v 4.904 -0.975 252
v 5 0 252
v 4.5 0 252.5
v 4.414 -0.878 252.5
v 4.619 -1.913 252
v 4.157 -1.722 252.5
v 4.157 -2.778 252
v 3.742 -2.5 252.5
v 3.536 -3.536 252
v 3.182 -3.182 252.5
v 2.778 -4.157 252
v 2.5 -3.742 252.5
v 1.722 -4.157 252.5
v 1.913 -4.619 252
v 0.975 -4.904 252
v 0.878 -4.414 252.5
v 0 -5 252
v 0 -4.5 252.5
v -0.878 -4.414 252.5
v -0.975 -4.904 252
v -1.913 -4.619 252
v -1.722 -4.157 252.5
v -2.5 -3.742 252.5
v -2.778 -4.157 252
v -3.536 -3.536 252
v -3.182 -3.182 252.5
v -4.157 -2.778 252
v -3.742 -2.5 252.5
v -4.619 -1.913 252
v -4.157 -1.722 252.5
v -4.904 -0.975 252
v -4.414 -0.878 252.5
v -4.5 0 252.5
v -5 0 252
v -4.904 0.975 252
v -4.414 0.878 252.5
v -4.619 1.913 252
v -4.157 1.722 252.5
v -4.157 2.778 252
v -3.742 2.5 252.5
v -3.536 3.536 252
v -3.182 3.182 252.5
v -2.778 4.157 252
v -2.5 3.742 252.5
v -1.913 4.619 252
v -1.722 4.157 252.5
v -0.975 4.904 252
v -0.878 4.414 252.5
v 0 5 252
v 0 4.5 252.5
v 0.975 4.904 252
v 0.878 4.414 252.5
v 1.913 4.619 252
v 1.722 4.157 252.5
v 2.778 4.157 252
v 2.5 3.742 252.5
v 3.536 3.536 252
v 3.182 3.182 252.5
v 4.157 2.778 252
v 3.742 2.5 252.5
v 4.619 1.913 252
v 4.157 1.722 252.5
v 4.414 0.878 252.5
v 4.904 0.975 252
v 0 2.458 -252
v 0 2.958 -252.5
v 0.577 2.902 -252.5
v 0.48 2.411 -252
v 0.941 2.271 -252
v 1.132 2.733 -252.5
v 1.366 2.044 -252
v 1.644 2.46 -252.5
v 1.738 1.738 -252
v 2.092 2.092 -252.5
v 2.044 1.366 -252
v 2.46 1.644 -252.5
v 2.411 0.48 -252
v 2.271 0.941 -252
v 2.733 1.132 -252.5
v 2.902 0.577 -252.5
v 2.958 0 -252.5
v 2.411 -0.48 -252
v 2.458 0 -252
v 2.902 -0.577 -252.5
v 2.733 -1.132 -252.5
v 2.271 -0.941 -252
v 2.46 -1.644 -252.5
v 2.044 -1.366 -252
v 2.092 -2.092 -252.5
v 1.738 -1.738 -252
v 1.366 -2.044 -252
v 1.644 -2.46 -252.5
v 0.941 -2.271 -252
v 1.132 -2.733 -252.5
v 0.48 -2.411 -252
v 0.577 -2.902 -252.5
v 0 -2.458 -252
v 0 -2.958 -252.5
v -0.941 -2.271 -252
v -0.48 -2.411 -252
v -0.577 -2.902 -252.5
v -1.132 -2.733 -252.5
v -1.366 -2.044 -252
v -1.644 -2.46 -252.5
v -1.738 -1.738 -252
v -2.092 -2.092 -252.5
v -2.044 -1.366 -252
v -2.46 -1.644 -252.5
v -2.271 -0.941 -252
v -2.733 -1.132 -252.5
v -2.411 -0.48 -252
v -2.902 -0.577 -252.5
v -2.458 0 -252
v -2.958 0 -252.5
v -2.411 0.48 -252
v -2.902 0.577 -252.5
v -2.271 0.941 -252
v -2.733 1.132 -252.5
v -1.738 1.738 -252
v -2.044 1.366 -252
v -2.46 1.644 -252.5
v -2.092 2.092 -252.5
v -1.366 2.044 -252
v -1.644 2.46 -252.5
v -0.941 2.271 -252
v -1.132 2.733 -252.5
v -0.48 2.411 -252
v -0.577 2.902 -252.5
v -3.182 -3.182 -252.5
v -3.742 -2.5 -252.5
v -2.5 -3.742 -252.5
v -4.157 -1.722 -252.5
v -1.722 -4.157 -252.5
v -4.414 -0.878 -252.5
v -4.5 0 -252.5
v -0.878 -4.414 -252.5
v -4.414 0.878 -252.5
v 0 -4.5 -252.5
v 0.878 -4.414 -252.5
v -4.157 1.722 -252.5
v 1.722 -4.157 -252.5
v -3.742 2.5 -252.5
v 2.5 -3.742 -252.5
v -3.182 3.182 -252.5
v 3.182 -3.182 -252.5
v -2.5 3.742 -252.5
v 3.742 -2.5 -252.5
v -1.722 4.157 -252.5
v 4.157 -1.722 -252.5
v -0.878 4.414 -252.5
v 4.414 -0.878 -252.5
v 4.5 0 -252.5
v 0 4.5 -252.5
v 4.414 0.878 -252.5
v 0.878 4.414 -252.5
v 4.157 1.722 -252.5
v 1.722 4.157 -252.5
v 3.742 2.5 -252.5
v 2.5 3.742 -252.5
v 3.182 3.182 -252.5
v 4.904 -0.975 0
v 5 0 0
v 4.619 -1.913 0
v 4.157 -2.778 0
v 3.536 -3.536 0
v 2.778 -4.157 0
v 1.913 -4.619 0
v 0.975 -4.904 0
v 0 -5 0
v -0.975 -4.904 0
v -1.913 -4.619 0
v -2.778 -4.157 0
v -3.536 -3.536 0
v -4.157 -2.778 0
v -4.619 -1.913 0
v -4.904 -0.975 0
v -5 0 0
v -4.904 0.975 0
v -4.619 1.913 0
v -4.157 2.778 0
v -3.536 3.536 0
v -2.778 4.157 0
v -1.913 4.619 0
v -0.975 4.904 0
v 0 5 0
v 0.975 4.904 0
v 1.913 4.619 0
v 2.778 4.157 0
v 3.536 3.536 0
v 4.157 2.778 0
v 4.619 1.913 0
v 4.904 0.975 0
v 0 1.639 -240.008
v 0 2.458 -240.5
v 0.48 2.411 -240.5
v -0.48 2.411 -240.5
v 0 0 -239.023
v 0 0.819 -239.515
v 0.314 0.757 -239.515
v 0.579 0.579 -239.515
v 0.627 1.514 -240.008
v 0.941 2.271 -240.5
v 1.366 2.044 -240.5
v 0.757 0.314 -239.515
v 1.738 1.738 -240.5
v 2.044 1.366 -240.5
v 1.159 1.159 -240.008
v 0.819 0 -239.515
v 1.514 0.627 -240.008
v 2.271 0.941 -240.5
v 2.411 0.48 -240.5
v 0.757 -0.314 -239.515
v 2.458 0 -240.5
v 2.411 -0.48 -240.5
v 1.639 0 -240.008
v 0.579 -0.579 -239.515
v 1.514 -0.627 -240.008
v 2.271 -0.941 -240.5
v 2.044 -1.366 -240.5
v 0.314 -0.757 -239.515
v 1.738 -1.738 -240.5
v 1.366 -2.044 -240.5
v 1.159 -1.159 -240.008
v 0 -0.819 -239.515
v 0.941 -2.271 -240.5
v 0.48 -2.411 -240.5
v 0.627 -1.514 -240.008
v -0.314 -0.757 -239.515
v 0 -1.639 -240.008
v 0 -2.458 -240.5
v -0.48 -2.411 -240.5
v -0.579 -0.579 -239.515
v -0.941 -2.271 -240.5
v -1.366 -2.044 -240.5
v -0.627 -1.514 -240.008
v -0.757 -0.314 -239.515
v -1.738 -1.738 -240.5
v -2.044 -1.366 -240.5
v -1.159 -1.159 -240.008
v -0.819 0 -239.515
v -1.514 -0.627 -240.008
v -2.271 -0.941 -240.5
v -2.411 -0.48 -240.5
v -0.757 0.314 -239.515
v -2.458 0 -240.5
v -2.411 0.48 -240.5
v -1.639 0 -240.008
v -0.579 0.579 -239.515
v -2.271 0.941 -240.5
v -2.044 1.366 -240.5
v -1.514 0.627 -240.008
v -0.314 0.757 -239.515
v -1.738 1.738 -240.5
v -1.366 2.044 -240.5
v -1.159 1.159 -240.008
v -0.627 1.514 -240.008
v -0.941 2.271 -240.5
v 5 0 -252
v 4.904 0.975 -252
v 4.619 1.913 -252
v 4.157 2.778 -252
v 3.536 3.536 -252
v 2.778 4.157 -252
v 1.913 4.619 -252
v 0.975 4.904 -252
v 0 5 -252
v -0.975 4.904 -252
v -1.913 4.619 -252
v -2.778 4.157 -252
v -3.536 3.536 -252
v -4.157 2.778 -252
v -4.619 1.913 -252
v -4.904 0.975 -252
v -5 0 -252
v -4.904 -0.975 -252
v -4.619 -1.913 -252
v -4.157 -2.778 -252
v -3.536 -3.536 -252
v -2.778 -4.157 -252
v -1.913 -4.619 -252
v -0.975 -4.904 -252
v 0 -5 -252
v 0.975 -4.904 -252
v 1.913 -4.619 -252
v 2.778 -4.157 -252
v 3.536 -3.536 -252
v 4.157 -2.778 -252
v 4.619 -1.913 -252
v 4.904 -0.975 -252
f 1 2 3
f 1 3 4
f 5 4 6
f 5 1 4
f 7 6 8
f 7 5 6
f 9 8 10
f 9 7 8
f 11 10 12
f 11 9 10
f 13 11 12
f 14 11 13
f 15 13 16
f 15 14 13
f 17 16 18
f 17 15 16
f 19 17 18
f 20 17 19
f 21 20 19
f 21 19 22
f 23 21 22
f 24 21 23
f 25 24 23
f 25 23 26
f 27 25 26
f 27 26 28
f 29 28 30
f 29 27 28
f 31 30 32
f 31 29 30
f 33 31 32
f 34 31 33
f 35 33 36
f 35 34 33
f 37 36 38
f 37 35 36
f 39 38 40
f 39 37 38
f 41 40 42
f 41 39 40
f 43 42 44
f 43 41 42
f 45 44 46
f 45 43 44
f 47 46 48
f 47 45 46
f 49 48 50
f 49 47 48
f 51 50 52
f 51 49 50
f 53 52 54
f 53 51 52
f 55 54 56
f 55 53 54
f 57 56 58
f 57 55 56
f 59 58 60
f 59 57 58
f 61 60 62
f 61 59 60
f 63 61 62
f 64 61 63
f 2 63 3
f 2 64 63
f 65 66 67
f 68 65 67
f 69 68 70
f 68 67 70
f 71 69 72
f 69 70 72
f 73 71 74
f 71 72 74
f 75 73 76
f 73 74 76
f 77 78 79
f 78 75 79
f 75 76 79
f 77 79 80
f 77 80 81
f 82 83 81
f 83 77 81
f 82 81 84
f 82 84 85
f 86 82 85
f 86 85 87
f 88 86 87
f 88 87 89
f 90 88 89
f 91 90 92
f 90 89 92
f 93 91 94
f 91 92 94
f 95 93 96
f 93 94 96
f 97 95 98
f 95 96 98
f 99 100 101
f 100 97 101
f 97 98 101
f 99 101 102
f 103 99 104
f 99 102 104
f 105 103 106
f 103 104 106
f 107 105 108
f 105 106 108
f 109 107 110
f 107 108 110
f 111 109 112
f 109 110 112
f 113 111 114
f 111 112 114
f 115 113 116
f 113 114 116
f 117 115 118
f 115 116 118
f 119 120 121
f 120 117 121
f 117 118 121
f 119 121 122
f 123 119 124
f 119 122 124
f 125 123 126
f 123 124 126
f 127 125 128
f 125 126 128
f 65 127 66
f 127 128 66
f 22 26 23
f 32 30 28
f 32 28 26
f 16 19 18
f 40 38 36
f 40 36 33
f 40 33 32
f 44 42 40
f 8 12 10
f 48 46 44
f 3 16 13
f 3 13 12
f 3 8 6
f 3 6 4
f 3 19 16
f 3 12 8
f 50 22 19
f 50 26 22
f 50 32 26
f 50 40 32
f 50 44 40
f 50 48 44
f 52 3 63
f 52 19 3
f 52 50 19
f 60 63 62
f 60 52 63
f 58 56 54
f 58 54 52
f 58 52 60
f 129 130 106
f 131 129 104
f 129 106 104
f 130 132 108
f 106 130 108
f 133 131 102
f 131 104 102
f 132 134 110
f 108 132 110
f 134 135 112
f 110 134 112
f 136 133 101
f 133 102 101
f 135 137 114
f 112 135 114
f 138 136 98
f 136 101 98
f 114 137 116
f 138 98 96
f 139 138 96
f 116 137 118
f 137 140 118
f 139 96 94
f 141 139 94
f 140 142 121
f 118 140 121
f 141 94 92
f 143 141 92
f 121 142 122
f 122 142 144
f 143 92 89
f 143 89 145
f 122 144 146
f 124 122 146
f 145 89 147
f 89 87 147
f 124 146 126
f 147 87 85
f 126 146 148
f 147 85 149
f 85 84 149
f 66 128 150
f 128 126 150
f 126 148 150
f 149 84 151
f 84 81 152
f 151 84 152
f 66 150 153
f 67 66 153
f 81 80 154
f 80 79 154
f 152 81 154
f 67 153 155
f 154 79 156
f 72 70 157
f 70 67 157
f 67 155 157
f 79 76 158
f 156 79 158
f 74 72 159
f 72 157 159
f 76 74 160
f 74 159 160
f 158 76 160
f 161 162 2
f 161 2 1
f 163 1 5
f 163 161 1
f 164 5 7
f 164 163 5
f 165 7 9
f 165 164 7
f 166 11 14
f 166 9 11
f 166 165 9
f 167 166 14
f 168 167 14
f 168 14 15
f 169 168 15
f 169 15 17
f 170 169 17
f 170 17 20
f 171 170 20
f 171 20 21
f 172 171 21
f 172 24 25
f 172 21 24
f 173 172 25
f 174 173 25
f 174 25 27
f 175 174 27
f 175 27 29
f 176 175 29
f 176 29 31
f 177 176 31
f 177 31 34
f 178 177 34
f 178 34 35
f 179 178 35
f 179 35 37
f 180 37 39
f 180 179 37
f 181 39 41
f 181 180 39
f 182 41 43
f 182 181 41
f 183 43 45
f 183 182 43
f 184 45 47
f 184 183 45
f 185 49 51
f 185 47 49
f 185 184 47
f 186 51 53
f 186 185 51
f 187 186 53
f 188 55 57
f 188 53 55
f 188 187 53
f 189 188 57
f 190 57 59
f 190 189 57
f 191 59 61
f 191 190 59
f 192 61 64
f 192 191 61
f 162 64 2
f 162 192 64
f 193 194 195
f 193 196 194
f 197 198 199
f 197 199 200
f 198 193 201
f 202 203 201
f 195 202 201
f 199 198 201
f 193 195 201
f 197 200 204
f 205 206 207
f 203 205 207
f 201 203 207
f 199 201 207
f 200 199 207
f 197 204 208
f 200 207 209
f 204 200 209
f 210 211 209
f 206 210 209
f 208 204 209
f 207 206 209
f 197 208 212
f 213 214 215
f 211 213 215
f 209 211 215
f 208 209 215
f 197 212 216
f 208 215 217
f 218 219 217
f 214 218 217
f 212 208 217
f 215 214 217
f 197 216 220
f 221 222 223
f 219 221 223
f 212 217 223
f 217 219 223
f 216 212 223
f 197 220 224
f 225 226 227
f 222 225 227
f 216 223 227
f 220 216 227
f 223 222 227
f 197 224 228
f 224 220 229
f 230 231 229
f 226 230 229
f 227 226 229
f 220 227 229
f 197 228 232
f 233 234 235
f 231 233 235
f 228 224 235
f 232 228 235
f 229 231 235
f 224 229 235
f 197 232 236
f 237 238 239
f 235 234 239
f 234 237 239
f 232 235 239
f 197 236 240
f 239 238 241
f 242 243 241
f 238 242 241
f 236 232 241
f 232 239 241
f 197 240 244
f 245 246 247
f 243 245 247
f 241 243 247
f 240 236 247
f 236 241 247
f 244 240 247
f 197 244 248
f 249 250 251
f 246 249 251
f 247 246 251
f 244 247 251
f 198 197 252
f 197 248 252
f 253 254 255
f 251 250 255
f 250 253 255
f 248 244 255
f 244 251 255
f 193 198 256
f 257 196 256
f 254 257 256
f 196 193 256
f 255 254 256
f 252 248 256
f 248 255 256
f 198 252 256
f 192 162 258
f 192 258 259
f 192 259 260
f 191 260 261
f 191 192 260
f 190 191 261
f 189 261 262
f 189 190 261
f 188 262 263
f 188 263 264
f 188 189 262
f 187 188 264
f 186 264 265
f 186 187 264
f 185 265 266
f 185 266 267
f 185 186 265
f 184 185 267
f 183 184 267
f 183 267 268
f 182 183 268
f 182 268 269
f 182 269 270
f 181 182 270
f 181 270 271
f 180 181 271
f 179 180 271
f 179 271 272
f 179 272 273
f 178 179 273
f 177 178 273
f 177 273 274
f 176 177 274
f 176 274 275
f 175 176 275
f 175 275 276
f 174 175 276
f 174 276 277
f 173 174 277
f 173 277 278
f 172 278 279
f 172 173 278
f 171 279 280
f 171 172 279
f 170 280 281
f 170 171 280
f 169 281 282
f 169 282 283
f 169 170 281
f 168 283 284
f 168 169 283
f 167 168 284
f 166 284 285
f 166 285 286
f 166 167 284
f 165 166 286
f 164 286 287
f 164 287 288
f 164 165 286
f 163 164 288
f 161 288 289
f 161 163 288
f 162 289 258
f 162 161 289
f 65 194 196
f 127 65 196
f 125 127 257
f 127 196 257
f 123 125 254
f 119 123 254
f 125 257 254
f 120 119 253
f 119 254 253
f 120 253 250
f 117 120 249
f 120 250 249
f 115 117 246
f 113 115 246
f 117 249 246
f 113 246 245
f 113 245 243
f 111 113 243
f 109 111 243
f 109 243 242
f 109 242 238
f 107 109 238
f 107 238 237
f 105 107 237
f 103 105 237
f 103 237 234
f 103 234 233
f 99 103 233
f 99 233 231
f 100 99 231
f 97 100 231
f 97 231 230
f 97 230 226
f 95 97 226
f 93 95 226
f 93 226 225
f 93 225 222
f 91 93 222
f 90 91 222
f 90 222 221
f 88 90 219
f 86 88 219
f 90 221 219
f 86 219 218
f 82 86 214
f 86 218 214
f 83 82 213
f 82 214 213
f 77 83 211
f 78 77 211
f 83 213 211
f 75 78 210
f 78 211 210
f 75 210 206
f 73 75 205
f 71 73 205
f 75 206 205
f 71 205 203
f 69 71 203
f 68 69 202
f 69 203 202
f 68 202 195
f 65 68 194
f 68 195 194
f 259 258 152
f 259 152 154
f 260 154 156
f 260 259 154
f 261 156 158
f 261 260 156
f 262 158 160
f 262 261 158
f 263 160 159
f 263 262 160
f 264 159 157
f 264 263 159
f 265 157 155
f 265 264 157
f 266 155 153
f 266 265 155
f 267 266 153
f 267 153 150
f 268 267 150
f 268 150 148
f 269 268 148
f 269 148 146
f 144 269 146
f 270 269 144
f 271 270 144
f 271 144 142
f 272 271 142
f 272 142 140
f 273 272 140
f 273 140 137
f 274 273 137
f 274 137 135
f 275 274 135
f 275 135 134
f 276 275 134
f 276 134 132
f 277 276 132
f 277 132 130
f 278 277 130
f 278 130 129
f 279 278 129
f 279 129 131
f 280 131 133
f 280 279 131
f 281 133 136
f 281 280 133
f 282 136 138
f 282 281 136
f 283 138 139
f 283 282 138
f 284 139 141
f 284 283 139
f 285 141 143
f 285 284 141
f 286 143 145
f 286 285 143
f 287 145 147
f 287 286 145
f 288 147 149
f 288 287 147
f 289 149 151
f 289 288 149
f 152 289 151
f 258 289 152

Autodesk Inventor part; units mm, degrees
ref_plane "YZ Plane" through (0, 0, 0) normal (1, 0, 0) x (0, 1, 0)
ref_plane "XZ Plane" through (0, 0, 0) normal (0, 1, 0) x (-1, 0, 0)
ref_plane "XY Plane" through (0, 0, 0) normal (0, 0, 1) x (1, 0, 0)
sketch "Skizze2" plane through (0, 0, 0) normal (0, 0, 1) x (1, 0, 0)
  circle A0 centre (0, 0) radius 5
  dimension "d0" = 10
extrude "Extrusion1" add sketch "Skizze2" along normal mid plane 505
sketch "Skizze3" plane through (0, 0, -252.5) normal (0, 0, -1) x (-1, 0, 0)
  point P0 (0, 0)
  point P1 (0, 0)
hole "Bohrung1" at (0, 0, -252.5) direction (0, 0, 1) diameter 4.917 depth 12 tip angle 118 thread size "M6x1" class "6H" standard "ISO Metric profile"
chamfer "Fasen1" distance 0.5 angle 45 3 edges at (0, -2.4585, -252.5) (-5, 0, -252.5) (-5, 0, 252.5)
equation "\"d0\" = Durchmesser_fuehrungsstab"
equation "\"d1\" = Hoehe_Magazin + Fuehrung_Bodenplatte"
equation "\"d4\" = Tiefe_Bohrung"
equation "\"d10\" = Fase"
equation "\"Durchmesser_fuehrungsstab\" = 10"
equation "\"Hoehe_Magazin\" = 500"
equation "\"Tiefe_Bohrung\" = 10"
equation "\"Fuehrung_Bodenplatte\" = 5"
equation "\"Fase\" = 0.5"
properties part number "TS_Magazin_Fuehrungselement_int"
